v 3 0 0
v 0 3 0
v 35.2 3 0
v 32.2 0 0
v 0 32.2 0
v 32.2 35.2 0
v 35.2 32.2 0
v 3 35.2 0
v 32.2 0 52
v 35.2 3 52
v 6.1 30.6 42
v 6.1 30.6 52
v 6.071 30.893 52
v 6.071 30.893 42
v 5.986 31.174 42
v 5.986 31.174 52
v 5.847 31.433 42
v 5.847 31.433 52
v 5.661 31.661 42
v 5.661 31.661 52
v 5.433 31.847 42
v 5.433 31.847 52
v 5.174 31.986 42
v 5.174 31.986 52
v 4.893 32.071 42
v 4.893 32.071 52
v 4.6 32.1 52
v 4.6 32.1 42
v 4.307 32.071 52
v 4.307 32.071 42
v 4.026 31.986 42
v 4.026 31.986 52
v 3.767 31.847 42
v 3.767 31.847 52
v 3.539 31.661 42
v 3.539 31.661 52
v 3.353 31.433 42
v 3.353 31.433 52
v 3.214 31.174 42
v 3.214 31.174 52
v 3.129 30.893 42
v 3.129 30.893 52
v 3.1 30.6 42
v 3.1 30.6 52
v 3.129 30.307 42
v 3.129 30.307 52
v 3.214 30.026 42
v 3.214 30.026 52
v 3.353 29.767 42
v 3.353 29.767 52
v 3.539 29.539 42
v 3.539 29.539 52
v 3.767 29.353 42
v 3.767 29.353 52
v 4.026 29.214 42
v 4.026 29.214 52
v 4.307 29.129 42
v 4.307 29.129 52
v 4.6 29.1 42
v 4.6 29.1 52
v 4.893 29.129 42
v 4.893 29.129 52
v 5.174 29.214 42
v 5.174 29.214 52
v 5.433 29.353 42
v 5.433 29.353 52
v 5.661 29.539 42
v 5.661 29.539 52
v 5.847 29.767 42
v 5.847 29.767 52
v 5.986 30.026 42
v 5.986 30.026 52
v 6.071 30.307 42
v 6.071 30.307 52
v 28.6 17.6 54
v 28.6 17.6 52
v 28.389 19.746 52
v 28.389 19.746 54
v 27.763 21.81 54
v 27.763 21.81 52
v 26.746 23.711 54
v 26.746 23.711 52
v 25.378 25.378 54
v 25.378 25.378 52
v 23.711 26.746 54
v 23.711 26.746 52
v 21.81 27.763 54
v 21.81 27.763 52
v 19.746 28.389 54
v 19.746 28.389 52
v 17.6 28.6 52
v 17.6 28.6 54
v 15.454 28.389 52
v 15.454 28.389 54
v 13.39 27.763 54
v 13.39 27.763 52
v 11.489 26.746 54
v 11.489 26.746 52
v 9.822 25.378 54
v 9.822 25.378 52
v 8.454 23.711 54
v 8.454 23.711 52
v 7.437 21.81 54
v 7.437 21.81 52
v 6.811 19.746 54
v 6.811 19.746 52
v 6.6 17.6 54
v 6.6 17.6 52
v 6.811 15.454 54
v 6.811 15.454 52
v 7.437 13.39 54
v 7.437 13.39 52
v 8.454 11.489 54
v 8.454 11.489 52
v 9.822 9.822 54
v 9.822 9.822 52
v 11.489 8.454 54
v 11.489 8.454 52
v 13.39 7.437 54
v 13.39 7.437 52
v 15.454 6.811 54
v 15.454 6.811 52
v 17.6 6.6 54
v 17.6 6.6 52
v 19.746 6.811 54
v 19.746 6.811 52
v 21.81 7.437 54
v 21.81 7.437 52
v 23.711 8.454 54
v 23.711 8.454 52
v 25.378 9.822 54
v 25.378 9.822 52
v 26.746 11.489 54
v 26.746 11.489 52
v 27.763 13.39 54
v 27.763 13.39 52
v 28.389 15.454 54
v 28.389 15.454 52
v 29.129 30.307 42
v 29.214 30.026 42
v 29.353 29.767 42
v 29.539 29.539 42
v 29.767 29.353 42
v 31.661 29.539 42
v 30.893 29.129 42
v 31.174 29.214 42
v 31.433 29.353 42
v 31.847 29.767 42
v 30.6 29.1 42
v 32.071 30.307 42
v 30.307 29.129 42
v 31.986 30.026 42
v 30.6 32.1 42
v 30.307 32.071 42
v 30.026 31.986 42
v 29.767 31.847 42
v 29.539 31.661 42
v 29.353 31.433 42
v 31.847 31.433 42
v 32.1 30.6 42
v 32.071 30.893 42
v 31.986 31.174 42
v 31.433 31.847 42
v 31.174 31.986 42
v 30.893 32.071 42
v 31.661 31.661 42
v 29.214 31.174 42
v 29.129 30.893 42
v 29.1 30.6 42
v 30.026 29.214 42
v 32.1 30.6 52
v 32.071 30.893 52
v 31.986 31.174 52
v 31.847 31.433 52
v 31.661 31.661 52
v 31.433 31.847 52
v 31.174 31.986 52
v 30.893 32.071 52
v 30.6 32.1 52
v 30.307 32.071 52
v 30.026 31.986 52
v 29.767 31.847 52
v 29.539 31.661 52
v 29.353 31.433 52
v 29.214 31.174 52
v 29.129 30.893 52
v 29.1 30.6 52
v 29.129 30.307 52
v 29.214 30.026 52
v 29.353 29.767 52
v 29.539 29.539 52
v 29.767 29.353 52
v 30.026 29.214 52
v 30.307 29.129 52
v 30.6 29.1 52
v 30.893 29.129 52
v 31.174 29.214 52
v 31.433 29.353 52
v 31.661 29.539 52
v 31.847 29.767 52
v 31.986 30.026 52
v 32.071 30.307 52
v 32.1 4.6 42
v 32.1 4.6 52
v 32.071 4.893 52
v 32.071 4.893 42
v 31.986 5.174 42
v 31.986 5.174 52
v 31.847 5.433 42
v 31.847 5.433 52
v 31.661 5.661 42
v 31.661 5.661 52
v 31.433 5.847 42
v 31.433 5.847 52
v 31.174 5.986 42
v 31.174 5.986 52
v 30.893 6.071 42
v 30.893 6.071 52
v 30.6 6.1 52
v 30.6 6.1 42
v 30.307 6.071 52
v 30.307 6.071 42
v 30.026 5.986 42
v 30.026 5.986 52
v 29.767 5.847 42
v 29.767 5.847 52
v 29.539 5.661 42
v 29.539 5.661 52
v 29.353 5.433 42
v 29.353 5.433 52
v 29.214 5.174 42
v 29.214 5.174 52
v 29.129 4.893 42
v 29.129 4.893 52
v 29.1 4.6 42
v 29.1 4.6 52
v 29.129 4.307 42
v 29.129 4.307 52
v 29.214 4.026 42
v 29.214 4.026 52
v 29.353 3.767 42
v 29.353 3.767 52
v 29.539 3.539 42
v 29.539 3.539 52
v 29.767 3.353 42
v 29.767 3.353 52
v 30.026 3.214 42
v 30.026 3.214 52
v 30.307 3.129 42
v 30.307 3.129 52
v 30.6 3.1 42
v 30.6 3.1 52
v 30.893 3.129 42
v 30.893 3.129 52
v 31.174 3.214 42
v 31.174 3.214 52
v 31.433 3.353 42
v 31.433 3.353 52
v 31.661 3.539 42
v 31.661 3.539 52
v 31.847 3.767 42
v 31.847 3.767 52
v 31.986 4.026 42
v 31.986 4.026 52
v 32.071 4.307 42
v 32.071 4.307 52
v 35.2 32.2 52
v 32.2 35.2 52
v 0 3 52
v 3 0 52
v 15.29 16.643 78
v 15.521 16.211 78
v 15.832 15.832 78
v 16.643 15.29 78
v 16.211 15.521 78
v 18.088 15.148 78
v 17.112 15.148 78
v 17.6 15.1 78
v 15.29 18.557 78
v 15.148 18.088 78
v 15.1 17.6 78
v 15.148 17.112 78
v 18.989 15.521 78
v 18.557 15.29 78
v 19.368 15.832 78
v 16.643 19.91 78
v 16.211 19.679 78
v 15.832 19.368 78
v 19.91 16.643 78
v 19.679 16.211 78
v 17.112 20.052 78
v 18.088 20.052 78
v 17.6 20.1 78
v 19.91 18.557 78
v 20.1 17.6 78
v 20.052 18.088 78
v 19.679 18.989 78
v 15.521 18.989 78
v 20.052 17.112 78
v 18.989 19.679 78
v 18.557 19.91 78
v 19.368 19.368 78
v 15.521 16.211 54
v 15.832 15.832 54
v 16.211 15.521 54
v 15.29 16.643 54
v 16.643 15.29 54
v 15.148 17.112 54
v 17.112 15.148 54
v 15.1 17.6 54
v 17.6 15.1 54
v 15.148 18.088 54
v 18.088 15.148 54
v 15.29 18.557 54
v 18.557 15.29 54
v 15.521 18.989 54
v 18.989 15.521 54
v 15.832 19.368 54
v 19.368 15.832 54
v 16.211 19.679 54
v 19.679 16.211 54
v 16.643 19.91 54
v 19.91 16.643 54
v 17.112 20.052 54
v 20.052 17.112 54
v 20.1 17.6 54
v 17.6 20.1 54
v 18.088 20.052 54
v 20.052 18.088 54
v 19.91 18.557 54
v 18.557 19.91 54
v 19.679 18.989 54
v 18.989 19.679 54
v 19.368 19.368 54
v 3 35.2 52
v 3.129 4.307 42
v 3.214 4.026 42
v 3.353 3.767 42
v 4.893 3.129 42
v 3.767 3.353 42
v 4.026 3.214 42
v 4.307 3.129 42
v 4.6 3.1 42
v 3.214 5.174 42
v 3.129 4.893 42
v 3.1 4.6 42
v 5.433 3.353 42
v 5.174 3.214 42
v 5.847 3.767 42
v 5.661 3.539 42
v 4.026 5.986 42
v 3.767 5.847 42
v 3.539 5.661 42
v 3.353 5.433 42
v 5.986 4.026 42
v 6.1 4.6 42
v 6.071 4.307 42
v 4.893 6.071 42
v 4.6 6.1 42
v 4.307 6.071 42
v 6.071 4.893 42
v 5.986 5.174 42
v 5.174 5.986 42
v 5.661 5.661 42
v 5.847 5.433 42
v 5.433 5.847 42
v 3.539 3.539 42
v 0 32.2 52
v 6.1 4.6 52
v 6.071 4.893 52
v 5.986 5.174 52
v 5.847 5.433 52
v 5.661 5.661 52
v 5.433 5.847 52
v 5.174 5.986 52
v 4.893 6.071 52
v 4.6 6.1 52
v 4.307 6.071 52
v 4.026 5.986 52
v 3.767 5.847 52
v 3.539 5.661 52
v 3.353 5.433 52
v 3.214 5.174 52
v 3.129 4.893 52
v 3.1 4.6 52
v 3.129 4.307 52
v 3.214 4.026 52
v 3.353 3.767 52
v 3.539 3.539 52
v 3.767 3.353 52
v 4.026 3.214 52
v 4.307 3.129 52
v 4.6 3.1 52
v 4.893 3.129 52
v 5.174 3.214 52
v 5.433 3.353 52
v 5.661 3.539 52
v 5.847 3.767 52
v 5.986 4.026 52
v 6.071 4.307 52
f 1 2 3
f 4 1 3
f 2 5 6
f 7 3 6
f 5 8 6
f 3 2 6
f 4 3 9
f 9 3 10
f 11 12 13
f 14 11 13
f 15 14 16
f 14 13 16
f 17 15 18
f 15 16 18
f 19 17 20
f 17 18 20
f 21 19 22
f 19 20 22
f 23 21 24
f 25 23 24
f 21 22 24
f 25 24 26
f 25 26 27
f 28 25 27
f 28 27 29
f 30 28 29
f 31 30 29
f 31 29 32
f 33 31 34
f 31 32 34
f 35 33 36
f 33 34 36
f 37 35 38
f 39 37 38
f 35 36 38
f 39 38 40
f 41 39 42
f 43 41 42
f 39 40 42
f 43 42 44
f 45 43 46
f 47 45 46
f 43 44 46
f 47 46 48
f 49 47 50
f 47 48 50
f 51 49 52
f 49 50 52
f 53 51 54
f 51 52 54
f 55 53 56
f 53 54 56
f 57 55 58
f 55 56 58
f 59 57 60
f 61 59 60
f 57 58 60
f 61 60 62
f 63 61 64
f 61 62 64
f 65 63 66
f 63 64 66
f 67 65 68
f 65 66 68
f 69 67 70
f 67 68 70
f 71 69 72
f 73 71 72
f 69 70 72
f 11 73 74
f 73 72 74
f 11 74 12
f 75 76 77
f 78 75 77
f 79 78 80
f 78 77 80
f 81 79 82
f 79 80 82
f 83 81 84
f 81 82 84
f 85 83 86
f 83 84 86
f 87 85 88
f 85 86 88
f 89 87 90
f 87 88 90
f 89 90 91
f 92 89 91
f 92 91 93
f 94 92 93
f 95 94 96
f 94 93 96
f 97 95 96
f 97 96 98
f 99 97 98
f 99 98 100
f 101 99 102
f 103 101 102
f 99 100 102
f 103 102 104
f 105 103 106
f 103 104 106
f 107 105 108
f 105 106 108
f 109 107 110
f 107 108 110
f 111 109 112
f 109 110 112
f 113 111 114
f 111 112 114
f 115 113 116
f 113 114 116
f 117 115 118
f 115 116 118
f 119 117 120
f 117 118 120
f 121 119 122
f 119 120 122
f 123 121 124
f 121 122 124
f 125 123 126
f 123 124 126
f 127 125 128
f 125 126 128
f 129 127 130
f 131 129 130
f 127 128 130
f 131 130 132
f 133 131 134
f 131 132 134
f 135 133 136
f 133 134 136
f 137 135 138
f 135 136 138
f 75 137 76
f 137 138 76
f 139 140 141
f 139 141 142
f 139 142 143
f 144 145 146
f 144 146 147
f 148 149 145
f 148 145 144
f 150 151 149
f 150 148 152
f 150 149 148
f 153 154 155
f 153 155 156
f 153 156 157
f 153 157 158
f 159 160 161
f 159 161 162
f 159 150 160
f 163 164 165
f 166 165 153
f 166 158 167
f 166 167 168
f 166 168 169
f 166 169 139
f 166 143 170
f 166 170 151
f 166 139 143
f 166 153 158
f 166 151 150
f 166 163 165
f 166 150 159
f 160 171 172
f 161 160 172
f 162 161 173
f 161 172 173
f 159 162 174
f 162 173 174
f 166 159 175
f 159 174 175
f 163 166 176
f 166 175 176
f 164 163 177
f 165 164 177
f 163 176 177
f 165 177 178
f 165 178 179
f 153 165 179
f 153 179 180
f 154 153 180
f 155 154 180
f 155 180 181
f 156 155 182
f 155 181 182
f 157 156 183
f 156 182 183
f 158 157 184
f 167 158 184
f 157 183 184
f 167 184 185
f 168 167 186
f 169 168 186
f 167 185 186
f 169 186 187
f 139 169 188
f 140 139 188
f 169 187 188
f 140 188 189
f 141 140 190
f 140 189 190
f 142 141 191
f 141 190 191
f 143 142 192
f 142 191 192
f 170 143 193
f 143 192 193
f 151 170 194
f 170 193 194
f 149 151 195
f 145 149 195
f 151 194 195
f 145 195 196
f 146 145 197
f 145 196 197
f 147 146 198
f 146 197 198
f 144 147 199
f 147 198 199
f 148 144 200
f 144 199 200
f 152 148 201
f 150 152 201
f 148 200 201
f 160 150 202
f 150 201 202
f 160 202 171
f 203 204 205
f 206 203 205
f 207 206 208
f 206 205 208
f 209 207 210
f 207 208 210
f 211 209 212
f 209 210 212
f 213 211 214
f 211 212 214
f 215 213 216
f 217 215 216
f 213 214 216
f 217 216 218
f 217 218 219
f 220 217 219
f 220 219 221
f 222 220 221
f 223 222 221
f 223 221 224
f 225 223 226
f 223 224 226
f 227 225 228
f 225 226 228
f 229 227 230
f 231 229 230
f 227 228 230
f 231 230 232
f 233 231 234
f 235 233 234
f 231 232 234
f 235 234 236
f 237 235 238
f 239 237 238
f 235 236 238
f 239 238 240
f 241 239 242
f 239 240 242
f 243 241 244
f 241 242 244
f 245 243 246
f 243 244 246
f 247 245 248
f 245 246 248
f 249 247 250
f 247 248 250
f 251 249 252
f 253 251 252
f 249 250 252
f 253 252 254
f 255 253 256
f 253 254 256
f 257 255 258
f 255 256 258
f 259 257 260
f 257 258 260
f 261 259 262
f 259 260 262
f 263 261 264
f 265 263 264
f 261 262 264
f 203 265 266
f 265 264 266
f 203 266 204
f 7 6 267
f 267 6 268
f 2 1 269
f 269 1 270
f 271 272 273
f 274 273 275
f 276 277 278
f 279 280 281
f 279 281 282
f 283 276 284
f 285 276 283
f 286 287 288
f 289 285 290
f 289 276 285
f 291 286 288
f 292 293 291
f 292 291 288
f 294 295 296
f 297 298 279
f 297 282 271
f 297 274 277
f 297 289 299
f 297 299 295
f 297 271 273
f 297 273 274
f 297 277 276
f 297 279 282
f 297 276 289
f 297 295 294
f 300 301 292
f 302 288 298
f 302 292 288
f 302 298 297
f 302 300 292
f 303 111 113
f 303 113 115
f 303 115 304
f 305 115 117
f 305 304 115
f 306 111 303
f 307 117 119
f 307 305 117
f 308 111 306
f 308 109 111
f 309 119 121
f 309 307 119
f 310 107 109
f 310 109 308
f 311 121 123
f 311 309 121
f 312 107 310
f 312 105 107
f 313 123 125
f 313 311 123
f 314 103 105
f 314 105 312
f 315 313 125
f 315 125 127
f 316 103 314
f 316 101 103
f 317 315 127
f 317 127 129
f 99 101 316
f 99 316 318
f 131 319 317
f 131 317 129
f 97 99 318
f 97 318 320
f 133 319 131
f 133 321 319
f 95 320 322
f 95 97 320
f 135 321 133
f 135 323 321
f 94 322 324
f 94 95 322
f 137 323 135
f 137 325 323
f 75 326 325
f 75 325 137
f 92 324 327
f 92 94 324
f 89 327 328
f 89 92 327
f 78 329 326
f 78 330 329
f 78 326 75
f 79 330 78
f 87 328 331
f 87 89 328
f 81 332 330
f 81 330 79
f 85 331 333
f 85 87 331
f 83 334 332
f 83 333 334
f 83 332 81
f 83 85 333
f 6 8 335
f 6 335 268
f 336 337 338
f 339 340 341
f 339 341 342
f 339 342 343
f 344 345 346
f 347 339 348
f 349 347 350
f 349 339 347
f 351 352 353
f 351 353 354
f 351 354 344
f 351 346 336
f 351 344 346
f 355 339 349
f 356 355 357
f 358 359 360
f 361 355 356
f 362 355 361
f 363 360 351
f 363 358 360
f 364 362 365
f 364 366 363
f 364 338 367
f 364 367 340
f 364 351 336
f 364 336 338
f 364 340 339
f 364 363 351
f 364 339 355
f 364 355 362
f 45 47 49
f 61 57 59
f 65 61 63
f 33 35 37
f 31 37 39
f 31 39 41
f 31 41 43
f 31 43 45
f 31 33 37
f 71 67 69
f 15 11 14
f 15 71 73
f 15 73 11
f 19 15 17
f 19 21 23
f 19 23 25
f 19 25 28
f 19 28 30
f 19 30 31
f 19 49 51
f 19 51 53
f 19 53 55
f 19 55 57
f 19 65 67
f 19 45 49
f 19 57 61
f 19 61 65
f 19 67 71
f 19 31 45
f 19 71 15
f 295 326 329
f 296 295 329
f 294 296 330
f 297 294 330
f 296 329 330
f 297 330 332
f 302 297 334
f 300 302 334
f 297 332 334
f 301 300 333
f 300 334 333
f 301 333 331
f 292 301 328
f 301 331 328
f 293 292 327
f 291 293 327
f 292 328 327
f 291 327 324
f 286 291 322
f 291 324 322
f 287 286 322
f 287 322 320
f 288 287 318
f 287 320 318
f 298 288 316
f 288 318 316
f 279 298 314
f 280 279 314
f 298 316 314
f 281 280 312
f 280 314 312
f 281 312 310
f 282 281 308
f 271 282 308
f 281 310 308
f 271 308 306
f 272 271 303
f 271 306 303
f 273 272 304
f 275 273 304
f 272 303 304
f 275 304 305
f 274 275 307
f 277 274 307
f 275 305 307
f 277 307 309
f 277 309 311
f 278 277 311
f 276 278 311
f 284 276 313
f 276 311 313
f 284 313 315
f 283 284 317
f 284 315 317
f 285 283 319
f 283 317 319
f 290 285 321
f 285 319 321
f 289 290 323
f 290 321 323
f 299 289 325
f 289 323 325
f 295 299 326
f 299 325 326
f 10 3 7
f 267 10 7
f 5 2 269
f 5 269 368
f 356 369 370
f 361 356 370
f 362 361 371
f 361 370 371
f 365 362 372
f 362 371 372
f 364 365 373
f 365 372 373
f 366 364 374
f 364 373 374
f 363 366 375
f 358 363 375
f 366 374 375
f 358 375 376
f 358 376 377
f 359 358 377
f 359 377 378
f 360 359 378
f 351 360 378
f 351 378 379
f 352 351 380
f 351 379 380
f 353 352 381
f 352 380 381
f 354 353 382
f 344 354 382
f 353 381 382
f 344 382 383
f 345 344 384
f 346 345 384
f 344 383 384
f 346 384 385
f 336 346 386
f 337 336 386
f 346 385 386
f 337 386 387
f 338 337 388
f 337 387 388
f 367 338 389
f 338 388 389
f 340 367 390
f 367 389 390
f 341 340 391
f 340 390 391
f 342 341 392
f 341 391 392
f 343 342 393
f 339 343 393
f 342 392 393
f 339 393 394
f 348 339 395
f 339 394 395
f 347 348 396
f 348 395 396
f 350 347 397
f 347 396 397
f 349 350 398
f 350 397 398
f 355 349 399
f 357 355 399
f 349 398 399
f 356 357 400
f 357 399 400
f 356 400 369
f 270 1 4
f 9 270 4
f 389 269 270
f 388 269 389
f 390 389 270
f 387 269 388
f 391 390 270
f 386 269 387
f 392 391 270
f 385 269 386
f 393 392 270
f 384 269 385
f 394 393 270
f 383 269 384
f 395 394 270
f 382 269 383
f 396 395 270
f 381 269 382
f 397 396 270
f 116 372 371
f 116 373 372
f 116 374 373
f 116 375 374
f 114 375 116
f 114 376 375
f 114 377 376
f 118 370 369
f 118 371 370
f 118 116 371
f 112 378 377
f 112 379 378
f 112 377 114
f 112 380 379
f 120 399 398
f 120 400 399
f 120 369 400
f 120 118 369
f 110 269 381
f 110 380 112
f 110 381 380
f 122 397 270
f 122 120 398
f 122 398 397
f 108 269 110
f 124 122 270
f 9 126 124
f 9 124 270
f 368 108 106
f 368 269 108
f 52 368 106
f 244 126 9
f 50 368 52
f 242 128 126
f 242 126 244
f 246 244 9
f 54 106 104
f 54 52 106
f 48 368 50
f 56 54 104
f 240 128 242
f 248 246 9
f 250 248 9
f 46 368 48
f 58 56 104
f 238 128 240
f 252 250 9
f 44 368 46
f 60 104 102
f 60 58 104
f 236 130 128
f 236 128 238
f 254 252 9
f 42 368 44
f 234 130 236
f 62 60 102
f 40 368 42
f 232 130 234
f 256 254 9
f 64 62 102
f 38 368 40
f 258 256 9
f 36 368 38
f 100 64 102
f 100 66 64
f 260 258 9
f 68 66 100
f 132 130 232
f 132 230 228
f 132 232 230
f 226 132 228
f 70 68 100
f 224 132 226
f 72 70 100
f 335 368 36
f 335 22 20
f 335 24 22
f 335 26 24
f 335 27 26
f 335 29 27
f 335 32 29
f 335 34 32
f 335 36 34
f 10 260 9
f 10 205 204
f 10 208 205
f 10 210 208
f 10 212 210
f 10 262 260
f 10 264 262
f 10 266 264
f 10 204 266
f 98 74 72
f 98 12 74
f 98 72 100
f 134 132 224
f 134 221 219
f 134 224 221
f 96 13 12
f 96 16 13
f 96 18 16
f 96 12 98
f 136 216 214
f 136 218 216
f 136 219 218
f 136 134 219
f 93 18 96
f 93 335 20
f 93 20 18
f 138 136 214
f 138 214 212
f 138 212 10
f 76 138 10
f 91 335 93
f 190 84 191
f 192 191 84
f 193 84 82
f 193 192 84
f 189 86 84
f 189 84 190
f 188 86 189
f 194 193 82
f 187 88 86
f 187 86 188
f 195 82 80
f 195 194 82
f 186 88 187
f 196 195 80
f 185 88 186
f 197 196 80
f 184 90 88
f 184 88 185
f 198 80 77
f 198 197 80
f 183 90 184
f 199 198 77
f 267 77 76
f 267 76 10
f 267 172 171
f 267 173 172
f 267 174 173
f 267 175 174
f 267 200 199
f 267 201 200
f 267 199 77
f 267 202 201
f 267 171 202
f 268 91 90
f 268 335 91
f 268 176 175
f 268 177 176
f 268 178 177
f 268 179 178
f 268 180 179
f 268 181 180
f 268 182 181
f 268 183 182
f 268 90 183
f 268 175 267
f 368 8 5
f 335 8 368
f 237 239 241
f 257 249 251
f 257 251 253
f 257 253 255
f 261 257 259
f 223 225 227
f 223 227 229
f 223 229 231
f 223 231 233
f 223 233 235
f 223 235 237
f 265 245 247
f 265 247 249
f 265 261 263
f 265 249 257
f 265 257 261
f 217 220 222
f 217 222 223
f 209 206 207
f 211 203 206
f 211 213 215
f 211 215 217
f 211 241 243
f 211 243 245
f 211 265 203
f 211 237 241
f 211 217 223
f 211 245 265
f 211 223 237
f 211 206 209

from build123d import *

# Parameters (mm, degrees)
F0_W     = 35.2
F0_H     = 35.2
F1_DEPTH = 52
F2_SIZE  = 3
F3_R     = 11
F4_DEPTH = 2
F5_R     = 2.5
F6_DEPTH = 24
F7_R     = 1.5
F8_DEPTH = 10


# Not quite as in the source:
# - a feature names something its author has since deleted; it is built from what else it names


with BuildPart() as f1:
    # F0 (on Top) → F1 (new body)
    with BuildSketch(Plane.XY):
        with Locations((17.6, 17.6)):
            Rectangle(F0_W, F0_H)
    extrude(amount=F1_DEPTH)

    # F2
    f2_edges = [f1.edges().sort_by_distance(p)[0] for p in [
        (0, 0, 26),
        (0, 35.2, 26),
        (35.2, 0, 26),
        (35.2, 35.2, 26),
    ]]
    chamfer(f2_edges, length=F2_SIZE)

    # F3 (on face) → F4 (join)
    with BuildSketch(Plane.XY.offset(52)):
        with Locations((17.6, 17.6)):
            Circle(F3_R)
    extrude(amount=F4_DEPTH)

    # F5 (on face) → F6 (join)
    with BuildSketch(Plane.XY.offset(54)):
        with Locations((17.6, 17.6)):
            Circle(F5_R)
    extrude(amount=F6_DEPTH)

    # F7 (on face) → F8 (cut)
    with BuildSketch(Plane.XY.offset(52)):
        with Locations((4.6, 30.6)):
            Circle(F7_R)
        with Locations((4.6, 4.6)):
            Circle(F7_R)
        with Locations((30.6, 30.6)):
            Circle(F7_R)
        with Locations((30.6, 4.6)):
            Circle(F7_R)
    extrude(amount=-F8_DEPTH, mode=Mode.SUBTRACT)


solid = f1.part
